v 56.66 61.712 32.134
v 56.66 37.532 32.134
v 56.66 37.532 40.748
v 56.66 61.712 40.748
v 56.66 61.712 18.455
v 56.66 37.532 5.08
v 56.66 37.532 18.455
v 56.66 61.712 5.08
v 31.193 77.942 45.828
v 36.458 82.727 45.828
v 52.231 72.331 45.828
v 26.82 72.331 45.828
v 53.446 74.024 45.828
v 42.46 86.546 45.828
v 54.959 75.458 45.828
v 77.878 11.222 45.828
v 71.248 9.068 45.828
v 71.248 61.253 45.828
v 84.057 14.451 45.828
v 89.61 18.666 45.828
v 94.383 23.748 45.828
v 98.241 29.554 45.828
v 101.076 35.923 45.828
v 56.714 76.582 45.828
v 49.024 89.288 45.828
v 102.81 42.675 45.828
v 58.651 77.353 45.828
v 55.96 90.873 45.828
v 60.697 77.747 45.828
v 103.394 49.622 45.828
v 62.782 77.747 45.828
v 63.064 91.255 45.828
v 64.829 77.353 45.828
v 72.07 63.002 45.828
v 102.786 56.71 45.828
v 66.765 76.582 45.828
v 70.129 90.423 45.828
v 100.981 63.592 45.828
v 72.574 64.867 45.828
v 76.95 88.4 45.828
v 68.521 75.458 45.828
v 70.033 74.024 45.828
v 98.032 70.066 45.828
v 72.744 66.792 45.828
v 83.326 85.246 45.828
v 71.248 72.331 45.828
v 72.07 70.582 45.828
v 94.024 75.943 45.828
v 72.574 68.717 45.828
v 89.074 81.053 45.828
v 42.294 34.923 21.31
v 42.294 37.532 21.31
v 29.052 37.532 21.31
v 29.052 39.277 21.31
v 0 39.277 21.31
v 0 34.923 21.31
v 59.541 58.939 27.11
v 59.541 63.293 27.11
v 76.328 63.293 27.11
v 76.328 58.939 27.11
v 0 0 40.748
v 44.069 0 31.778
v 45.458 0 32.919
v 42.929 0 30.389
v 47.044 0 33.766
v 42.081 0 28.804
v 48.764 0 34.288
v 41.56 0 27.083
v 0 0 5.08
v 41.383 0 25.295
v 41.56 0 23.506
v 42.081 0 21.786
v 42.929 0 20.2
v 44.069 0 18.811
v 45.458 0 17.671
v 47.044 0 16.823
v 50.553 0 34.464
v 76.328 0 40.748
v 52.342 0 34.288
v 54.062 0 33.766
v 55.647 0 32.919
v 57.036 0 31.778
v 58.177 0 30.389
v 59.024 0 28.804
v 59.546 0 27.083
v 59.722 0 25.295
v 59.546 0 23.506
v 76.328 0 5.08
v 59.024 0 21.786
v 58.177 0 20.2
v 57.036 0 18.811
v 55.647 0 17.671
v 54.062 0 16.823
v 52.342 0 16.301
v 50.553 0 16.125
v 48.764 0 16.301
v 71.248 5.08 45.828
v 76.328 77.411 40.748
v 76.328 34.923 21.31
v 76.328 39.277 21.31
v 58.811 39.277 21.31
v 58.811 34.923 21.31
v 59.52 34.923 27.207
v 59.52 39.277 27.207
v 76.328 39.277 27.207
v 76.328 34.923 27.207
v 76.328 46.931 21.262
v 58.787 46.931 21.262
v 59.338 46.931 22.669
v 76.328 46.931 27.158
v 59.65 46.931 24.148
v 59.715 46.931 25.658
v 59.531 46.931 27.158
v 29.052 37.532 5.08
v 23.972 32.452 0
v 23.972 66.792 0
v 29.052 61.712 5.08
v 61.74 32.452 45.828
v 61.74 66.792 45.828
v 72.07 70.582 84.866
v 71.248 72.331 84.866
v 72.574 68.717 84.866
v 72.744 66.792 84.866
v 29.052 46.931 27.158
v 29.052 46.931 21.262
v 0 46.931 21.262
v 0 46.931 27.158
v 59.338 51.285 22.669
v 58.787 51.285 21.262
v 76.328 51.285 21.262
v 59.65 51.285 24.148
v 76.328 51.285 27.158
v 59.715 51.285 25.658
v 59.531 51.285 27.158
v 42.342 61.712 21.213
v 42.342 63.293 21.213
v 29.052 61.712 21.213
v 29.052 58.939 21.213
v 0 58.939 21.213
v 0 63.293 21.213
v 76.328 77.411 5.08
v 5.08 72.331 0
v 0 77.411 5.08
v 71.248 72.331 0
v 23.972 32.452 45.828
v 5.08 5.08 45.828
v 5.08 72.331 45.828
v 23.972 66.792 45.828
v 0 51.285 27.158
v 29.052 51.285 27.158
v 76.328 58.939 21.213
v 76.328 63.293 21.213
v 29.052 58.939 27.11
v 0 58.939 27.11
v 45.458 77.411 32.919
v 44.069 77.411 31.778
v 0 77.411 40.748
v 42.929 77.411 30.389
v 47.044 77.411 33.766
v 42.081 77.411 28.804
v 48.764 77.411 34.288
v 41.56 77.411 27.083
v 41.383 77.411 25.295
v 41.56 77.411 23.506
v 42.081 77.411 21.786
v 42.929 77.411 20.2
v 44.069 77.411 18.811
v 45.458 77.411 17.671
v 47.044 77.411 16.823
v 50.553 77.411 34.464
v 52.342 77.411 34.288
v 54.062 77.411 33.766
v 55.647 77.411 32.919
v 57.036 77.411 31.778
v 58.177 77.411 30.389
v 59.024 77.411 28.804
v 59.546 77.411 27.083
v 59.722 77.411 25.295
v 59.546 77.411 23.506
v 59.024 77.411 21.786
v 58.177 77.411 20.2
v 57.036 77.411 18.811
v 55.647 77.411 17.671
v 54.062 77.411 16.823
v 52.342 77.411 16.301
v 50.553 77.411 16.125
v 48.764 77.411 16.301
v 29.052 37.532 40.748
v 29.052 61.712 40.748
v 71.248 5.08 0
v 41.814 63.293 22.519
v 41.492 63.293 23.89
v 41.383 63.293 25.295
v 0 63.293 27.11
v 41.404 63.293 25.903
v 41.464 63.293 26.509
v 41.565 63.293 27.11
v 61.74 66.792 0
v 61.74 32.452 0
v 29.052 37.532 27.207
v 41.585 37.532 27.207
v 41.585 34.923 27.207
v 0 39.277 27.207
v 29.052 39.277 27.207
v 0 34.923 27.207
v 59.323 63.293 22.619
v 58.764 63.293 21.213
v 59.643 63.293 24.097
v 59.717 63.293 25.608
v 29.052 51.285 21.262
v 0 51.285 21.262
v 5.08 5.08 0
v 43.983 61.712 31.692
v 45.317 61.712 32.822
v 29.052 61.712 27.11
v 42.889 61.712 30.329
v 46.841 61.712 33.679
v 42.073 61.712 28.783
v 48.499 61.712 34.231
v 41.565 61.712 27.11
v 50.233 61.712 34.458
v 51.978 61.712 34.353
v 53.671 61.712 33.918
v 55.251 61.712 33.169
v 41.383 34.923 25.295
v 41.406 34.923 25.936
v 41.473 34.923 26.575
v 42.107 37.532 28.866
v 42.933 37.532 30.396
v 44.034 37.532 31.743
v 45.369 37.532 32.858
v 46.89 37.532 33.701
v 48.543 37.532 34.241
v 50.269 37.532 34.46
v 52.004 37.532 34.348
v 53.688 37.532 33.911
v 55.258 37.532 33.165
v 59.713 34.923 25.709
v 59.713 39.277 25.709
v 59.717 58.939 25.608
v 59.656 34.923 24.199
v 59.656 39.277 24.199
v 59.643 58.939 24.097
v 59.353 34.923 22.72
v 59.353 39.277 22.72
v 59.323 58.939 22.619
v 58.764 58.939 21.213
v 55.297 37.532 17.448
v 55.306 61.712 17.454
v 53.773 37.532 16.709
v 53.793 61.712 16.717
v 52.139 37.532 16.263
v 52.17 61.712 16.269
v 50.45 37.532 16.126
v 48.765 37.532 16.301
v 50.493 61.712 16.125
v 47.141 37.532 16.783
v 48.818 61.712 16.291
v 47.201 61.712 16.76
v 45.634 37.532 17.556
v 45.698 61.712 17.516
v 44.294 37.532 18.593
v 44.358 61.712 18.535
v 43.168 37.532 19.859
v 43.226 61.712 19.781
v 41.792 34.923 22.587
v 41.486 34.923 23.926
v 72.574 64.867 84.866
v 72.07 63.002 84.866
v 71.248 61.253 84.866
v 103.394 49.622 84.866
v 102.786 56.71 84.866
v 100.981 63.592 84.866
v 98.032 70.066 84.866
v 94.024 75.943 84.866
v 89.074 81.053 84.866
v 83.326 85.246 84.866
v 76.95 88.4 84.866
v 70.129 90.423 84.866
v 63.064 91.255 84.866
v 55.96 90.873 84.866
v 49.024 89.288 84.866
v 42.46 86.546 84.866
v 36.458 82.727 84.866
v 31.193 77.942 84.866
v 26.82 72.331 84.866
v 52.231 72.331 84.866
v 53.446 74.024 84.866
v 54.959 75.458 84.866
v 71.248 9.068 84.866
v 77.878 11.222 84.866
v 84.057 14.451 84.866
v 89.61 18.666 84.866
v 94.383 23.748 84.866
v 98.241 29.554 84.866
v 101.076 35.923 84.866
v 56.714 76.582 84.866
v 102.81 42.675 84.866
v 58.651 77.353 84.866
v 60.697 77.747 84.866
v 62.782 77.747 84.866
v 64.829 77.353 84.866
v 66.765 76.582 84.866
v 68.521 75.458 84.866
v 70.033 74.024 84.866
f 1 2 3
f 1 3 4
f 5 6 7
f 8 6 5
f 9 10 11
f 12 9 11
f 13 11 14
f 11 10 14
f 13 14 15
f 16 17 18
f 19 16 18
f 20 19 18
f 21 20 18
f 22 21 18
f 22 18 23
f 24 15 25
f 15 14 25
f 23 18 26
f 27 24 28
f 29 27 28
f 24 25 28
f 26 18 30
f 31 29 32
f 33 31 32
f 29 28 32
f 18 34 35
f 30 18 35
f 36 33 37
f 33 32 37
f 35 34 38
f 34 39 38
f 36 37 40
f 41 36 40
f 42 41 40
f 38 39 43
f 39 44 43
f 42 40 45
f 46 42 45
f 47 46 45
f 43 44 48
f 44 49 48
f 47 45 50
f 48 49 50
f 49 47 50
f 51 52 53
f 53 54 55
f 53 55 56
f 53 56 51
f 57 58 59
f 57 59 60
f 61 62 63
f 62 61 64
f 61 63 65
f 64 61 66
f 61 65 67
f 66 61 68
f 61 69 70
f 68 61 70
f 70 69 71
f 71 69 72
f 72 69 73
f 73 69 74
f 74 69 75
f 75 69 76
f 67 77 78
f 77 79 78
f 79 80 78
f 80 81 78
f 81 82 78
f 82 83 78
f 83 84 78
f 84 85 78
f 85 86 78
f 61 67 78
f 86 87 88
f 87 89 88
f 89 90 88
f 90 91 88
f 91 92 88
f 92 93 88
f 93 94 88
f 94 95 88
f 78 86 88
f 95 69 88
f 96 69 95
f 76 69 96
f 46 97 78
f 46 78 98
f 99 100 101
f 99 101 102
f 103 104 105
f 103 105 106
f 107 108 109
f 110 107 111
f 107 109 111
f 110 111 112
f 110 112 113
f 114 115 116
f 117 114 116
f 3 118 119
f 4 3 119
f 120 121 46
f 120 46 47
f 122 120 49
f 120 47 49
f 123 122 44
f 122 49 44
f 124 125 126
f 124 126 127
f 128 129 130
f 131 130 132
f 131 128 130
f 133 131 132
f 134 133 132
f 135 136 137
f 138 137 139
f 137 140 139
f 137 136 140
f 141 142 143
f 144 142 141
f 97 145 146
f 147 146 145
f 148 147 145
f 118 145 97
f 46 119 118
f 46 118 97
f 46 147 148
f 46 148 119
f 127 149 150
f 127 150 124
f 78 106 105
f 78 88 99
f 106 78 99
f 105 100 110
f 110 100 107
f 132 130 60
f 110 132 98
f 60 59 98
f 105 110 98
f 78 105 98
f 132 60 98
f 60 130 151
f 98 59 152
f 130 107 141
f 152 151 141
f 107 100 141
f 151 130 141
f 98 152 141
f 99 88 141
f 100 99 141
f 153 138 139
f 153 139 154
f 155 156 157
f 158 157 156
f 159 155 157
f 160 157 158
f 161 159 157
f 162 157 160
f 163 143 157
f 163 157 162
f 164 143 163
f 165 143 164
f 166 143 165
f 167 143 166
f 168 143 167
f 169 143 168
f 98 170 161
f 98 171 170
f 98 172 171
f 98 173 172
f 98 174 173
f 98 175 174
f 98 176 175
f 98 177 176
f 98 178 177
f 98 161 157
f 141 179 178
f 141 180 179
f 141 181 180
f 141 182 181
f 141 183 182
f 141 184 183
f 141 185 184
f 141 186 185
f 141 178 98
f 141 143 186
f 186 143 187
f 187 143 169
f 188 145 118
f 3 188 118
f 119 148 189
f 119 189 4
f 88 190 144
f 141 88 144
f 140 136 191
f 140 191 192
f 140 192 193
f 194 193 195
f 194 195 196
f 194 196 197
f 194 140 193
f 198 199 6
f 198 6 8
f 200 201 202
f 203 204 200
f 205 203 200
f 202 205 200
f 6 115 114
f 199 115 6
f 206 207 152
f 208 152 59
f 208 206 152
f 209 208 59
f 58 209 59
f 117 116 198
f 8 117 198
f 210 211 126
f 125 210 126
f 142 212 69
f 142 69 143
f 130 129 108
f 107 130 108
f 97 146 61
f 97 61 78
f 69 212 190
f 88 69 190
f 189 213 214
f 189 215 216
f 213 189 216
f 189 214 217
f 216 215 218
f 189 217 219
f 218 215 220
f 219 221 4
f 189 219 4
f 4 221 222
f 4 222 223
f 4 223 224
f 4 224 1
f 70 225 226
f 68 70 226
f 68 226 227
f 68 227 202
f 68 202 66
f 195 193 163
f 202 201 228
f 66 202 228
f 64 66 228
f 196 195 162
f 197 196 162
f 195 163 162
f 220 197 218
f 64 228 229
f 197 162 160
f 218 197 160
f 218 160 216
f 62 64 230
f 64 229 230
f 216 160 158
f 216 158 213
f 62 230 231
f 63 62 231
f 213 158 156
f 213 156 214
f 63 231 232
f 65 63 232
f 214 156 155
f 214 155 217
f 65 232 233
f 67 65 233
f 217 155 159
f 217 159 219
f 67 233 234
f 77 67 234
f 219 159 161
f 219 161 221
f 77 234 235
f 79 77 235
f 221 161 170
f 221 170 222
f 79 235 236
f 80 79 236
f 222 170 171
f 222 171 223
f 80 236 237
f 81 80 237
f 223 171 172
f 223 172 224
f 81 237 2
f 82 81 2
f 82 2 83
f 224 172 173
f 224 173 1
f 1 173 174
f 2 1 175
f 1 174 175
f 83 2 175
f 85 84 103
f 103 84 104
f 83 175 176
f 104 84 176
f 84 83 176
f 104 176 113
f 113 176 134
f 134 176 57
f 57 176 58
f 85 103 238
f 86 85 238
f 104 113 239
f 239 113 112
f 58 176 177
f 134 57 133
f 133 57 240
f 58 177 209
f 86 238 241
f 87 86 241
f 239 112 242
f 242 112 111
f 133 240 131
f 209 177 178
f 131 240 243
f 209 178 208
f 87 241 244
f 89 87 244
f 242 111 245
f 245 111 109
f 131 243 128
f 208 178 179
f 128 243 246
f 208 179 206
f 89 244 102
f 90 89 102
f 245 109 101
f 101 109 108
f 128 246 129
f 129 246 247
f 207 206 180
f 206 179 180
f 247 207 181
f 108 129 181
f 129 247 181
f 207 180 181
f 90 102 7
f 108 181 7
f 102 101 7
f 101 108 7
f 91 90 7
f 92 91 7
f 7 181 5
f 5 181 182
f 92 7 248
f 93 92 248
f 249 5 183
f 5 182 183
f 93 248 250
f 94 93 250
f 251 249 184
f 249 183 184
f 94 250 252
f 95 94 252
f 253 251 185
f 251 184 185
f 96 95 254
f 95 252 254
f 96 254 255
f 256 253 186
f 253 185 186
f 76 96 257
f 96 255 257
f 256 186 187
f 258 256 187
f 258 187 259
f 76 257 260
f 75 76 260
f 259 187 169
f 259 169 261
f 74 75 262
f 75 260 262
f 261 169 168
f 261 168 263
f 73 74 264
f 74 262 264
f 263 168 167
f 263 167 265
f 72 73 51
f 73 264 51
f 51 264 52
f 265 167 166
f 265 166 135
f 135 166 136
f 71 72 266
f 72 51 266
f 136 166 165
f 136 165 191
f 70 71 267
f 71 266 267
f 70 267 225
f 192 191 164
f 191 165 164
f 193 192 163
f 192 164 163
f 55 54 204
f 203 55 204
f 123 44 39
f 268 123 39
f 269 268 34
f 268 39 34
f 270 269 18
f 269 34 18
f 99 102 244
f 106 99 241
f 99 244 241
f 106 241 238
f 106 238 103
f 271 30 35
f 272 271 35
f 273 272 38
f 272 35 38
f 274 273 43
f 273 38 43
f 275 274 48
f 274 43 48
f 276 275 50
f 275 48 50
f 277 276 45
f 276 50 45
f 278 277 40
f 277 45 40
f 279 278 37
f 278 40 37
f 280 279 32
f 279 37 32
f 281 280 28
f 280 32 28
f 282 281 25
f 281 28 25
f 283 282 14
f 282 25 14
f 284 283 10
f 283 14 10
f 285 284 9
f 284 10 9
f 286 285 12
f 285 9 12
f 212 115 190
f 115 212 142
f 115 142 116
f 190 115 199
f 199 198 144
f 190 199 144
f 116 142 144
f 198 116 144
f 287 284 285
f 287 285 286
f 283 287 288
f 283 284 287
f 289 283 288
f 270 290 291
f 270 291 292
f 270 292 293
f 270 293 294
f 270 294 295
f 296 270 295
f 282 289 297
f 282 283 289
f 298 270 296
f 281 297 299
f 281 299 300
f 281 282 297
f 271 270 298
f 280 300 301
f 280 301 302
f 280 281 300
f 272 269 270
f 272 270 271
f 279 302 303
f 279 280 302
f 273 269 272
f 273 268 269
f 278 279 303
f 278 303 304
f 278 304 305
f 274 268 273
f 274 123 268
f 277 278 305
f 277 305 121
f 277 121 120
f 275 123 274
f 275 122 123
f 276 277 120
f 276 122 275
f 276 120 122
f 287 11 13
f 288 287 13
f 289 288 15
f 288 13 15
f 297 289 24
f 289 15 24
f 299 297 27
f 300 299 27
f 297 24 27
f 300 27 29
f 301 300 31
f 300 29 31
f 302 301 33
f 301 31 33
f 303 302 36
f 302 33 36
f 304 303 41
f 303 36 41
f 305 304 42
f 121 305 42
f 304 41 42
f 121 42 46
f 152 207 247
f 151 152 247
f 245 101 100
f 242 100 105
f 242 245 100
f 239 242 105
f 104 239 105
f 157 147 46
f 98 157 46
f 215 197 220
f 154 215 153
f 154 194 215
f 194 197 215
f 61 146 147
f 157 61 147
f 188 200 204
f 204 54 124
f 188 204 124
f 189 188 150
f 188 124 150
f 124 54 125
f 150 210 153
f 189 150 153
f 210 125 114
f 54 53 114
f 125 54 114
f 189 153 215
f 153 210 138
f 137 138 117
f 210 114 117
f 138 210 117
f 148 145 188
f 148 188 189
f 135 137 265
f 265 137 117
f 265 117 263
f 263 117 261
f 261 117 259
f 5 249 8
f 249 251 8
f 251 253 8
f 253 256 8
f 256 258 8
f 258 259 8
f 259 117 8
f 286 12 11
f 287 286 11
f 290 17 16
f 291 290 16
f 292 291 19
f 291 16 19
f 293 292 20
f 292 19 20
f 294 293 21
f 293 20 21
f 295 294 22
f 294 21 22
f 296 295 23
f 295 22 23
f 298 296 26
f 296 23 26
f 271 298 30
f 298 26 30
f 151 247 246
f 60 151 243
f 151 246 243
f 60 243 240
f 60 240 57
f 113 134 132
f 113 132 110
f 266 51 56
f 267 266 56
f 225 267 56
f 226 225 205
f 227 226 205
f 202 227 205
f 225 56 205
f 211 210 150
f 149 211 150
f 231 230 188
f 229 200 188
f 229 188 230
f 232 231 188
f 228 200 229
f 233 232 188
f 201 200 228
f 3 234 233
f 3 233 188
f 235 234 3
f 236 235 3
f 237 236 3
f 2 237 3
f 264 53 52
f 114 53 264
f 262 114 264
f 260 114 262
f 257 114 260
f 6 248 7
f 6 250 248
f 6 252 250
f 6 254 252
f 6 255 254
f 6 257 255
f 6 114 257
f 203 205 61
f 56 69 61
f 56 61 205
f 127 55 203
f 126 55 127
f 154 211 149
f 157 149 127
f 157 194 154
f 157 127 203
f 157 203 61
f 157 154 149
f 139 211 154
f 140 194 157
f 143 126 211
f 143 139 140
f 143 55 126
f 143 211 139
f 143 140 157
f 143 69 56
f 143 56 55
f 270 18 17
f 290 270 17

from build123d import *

# Parameters (mm, degrees)
F0_W     = 76.3280242682
F0_H     = 77.4106830359
F0_W_2   = 27.6080071926
F0_H_2   = 24.1795629263
F1_DEPTH = 45.8278357983
F2_SIZE  = 5.08
F3_R     = 9.1693528208
F4_DEPTH = 77.4106830359
F5_W     = 4.3538063765
F5_H     = 5.8968309313
F6_DEPTH = 76.3290242682
F8_DEPTH = 39.0382464975


with BuildPart() as f1:
    # F0 (on Top) → F1 (new body)
    with BuildSketch(Plane.XY):
        with Locations((38.1640121341, 38.7053415179)):
            Rectangle(F0_W, F0_H)
        with Locations((42.8555756807, 49.6222302318)):
            Rectangle(F0_W_2, F0_H_2, mode=Mode.SUBTRACT)
    extrude(amount=F1_DEPTH)

    # F2
    f2_edges = [f1.edges().sort_by_distance(p)[0] for p in [
        (0, 38.705342, 45.827836),
        (38.164012, 0, 45.827836),
        (76.328024, 38.705342, 45.827836),
        (38.164012, 77.410683, 45.827836),
        (42.855576, 37.532449, 45.827836),
        (29.051572, 49.62223, 45.827836),
        (42.855576, 61.712012, 45.827836),
        (56.659579, 49.62223, 45.827836),
        (0, 38.705342, 0),
        (38.164012, 0, 0),
        (76.328024, 38.705342, 0),
        (38.164012, 77.410683, 0),
        (42.855576, 37.532449, 0),
        (29.051572, 49.62223, 0),
        (42.855576, 61.712012, 0),
        (56.659579, 49.62223, 0),
    ]]
    chamfer(f2_edges, length=F2_SIZE)

    # F3 (on face) → F4 (cut, through all)
    with BuildSketch(Plane(origin=(0, 77.4106830359, 0), x_dir=(-1, 0, 0), z_dir=(0, 1, 0))):
        with Locations((-50.5527034402, 25.2946168184)):
            Circle(F3_R)
    extrude(amount=-F4_DEPTH, mode=Mode.SUBTRACT)

    # F5 (on face) → F6 (cut, through all)
    with BuildSketch(Plane(origin=(0, 0, 0), x_dir=(0, -1, 0), z_dir=(-1, 0, 0))):
        with Locations((-61.1162558198, 24.1615613922)):
            Rectangle(F5_W, F5_H)
        with Locations((-49.1082109511, 24.2099286988)):
            Rectangle(F5_W, F5_H)
        with Locations((-37.1001660824, 24.2582960054)):
            Rectangle(F5_W, F5_H)
    extrude(amount=-F6_DEPTH, mode=Mode.SUBTRACT)


with BuildPart() as f8:
    # F7 (on face) → F8 (new body)
    with BuildSketch(Plane.XY.offset(45.8278357983)):
        with BuildLine():
            ThreePointArc((71.2480242682, 9.0679696025), (94.3825239668, 23.7475950977), (103.3936136715, 49.6222302318))
            ThreePointArc((103.3936136715, 49.6222302318), (73.5825647814, 89.5572058256), (26.8198892357, 72.3306830358))
            Line((26.8198892357, 72.3306830359), (52.2311342859, 72.3306830359))
            ThreePointArc((52.2311342859, 72.3306830359), (61.739579277, 77.7959839946), (71.2480242682, 72.3306830359))
            ThreePointArc((71.2480242682, 72.3306830359), (72.363092624, 69.6605253411), (72.7435515767, 66.7920116949))
            ThreePointArc((72.7435515767, 66.7920116949), (72.363092624, 63.9234980487), (71.2480242682, 61.253340354))
            Line((71.2480242682, 61.253340354), (71.2480242682, 9.0679696025))
        make_face()
    extrude(amount=F8_DEPTH)


solid = Compound([f1.part, f8.part])
